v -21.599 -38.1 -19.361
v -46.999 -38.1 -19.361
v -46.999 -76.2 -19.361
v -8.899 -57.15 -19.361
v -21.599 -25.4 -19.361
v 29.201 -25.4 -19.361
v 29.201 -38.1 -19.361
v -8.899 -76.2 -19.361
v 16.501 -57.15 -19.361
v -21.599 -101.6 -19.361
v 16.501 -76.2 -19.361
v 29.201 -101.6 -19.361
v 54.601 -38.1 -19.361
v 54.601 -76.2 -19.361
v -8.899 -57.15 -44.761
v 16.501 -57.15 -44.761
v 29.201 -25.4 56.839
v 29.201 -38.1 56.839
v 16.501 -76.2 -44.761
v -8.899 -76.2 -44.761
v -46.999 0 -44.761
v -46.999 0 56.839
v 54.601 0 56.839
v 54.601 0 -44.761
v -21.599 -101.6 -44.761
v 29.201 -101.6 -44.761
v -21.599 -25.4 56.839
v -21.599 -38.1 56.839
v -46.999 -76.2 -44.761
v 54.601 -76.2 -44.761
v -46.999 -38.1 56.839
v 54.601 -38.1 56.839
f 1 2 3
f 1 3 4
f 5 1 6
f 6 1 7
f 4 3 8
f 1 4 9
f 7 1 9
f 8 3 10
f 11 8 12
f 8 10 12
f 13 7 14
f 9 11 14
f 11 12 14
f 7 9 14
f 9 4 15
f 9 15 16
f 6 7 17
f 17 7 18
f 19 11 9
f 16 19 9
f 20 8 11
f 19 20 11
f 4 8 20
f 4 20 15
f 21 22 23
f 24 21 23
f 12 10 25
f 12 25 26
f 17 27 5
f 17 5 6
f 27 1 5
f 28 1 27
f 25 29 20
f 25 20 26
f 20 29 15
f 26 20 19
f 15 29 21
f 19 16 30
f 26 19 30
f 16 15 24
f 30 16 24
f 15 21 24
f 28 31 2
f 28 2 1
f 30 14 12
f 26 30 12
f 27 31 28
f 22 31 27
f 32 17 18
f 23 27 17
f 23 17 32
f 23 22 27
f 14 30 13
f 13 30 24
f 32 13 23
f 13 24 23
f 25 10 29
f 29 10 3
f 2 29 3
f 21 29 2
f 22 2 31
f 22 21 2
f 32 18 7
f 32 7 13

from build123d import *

# Parameters (mm, degrees)
F0_W      = 101.6
F0_H      = 101.6
F1_DEPTH  = 101.6
F2_W      = 50.8
F2_H      = 76.2
F3_DEPTH  = 76.2
F4_W      = 25.4
F4_H      = 76.2
F5_DEPTH  = 63.5
F7_DEPTH  = 25.4
F9_DEPTH  = 25.4
F10_W     = 25.4
F10_H     = 19.05
F11_DEPTH = 25.4


with BuildPart() as f1:
    # F0 (on Front) → F1 (new body)
    with BuildSketch(Plane.XZ):
        with Locations((3.801119, 6.039162)):
            Rectangle(F0_W, F0_H)
    extrude(amount=F1_DEPTH)

    # F2 (on face) → F3 (cut)
    with BuildSketch(Plane.XZ.offset(101.6)):
        with Locations((3.801119, 18.739162)):
            Rectangle(F2_W, F2_H)
    extrude(amount=-F3_DEPTH, mode=Mode.SUBTRACT)

    # F4 (on face) → F5 (cut)
    with BuildSketch(Plane.XZ.offset(101.6)):
        with Locations((41.901119, 18.739162)):
            Rectangle(F4_W, F4_H)
        with Locations((-34.298881, 18.739162)):
            Rectangle(F4_W, F4_H)
    extrude(amount=-F5_DEPTH, mode=Mode.SUBTRACT)

    # F6 (on face) → F7 (cut)
    with BuildSketch(Plane.XY.offset(-19.360838)):
        Polygon((29.201119, -101.6), (54.601119, -101.6), (54.601119, -76.2), align=None)
    extrude(amount=-F7_DEPTH, mode=Mode.SUBTRACT)

    # F8 (on face) → F9 (cut)
    with BuildSketch(Plane.XY.offset(-19.360838)):
        Polygon((-46.998881, -76.2), (-46.998881, -101.6), (-21.598881, -101.6), align=None)
    extrude(amount=-F9_DEPTH, mode=Mode.SUBTRACT)

    # F10 (on face) → F11 (cut)
    with BuildSketch(Plane.XY.offset(-19.360838)):
        with Locations((3.801119, -66.675)):
            Rectangle(F10_W, F10_H)
    extrude(amount=-F11_DEPTH, mode=Mode.SUBTRACT)


solid = f1.part
